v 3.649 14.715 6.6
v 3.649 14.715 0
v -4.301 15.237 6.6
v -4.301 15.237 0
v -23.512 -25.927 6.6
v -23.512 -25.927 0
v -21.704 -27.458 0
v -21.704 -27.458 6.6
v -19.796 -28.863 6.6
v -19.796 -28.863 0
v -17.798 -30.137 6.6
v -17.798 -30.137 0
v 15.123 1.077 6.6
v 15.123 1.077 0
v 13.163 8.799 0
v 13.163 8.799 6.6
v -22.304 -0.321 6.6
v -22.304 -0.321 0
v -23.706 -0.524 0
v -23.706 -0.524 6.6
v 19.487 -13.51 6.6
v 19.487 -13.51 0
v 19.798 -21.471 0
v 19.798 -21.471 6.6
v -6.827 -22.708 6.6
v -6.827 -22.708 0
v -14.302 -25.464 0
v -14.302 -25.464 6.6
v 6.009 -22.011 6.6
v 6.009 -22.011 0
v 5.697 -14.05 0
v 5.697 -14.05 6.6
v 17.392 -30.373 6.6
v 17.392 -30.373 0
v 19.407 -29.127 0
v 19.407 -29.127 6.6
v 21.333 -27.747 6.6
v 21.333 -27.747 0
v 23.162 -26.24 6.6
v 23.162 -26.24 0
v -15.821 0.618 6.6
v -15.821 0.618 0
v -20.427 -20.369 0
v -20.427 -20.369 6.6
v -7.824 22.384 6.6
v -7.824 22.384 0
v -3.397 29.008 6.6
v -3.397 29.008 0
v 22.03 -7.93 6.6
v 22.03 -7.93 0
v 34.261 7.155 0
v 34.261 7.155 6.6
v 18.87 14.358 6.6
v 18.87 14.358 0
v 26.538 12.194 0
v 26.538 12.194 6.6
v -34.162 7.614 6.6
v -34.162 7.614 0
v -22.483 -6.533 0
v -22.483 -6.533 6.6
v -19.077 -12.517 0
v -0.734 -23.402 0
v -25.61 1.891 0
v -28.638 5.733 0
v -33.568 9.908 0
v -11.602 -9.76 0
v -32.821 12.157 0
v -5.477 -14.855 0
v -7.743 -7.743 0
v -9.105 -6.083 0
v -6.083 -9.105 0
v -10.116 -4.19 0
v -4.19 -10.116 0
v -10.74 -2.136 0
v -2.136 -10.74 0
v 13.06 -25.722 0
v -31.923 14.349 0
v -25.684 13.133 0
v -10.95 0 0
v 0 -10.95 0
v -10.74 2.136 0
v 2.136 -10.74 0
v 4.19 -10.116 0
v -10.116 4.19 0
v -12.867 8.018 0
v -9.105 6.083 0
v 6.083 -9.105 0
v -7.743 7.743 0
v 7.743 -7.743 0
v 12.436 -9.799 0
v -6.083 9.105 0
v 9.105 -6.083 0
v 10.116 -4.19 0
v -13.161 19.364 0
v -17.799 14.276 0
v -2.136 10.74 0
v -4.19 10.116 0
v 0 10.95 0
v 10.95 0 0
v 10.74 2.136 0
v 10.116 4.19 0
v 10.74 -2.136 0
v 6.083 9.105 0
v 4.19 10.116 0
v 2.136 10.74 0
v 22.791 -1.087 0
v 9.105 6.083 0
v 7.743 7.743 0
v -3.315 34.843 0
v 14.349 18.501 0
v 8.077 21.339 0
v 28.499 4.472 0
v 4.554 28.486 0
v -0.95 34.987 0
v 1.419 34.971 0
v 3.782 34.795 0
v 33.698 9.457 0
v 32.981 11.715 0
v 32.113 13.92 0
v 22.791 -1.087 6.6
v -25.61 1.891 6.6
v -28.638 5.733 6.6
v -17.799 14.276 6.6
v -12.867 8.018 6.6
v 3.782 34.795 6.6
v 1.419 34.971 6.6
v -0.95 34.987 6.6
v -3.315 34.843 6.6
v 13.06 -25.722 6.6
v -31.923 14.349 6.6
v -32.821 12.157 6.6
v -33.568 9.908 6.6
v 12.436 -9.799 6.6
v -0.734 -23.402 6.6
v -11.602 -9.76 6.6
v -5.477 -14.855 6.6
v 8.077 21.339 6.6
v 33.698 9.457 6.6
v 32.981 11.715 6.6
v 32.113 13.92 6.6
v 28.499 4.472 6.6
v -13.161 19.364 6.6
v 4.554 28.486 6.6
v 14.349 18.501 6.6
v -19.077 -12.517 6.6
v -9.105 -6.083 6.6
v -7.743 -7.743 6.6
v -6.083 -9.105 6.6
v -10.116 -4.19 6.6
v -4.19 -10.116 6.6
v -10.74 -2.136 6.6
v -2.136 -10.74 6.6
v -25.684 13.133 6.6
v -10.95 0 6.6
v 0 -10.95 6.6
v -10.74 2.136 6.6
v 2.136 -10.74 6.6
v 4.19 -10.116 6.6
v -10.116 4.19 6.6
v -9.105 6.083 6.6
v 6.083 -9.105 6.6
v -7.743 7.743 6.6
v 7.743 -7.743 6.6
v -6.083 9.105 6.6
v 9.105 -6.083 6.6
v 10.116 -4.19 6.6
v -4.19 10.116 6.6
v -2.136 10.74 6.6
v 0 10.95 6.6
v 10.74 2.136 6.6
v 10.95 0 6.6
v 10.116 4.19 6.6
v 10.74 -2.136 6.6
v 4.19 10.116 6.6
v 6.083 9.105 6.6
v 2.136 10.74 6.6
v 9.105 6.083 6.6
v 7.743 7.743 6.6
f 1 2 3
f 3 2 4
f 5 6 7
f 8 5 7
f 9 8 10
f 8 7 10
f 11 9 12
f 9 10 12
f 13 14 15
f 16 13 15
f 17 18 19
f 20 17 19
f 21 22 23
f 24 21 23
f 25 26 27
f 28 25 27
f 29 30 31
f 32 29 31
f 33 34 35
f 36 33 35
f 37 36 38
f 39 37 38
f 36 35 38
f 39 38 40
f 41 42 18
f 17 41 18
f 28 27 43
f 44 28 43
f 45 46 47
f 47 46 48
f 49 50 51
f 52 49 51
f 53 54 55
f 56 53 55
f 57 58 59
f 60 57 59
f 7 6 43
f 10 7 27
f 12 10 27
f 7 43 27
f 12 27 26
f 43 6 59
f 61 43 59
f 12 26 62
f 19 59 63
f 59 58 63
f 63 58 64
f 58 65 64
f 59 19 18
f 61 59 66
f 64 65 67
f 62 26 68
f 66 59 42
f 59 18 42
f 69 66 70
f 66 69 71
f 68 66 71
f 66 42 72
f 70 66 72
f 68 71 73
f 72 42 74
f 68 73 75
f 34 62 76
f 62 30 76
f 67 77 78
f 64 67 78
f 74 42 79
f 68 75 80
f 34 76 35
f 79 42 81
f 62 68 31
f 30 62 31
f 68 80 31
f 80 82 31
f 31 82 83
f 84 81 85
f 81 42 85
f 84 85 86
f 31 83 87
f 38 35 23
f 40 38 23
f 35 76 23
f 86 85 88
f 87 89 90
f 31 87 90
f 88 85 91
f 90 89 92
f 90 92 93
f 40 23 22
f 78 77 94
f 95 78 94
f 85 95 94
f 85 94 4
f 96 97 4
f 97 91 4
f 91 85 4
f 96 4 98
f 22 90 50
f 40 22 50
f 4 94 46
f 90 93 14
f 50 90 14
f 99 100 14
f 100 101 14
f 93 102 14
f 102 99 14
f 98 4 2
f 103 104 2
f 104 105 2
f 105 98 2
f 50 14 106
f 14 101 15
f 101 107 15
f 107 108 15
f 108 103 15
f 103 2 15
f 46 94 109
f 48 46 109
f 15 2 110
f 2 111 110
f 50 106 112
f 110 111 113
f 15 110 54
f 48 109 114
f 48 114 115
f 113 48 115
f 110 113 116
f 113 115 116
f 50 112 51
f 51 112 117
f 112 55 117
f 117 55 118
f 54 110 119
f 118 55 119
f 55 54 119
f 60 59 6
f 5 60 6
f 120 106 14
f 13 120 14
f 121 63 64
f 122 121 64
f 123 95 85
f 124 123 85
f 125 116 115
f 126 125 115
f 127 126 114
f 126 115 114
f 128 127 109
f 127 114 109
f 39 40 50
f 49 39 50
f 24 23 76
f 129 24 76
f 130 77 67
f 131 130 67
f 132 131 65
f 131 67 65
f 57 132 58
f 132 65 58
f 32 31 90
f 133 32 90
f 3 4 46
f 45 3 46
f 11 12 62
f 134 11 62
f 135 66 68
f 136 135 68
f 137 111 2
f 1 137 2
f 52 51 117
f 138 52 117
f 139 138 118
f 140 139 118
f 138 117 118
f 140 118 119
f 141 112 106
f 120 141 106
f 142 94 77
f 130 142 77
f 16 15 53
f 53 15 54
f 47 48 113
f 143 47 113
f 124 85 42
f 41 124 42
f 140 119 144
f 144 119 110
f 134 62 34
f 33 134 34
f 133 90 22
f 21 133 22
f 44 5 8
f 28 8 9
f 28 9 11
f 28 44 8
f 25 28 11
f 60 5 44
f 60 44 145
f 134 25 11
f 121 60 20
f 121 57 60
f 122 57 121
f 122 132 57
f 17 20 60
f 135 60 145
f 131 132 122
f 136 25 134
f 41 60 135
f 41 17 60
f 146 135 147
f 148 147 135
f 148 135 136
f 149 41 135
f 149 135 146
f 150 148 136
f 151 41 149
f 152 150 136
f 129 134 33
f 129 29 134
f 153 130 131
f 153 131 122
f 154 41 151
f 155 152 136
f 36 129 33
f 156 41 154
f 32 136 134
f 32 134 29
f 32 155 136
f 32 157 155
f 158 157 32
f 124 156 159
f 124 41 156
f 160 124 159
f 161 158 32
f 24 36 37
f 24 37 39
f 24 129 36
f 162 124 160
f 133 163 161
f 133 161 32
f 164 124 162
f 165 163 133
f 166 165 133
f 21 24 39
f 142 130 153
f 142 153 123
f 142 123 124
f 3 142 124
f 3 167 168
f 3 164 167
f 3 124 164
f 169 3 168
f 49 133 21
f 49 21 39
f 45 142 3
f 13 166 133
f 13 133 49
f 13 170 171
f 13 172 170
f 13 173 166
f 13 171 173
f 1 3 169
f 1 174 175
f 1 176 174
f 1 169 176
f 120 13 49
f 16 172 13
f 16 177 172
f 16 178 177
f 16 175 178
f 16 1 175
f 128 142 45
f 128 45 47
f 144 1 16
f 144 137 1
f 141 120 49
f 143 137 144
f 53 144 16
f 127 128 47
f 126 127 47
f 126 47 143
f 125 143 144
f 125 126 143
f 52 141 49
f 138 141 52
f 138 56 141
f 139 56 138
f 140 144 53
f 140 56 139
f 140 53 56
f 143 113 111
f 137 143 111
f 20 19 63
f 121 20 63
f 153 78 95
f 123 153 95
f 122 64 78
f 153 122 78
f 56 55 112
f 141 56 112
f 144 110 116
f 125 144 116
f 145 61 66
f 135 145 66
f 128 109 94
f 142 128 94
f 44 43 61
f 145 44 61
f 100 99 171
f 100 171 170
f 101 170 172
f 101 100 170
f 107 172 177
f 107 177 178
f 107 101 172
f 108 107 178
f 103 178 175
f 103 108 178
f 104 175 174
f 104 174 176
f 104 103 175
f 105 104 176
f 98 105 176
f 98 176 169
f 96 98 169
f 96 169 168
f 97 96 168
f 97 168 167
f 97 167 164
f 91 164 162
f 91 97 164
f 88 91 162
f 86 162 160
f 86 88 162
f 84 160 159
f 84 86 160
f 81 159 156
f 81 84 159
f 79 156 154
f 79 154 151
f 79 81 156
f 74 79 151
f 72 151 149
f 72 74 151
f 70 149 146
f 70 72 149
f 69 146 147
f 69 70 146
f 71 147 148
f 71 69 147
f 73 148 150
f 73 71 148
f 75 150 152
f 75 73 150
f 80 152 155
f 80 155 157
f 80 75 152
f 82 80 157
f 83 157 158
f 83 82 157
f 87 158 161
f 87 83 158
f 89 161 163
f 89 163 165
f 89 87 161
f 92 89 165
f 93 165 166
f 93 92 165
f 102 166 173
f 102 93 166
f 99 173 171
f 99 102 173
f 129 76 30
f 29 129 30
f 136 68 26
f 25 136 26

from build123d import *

# Parameters (mm, degrees)
F0_R     = 10.95
F1_DEPTH = 6.6


with BuildPart() as f1:
    # F0 (on Top) → F1 (new body)
    with BuildSketch(Plane.XY):
        with BuildLine():
            Line((-22.483416, -6.533214), (-23.511816, -25.926714))
            ThreePointArc((-23.511816, -25.926714), (-20.762047, -28.176895), (-17.79831, -30.136691))
            Line((-17.79831, -30.136691), (-0.734302, -23.401873))
            Line((-0.734302, -23.401873), (17.39222, -30.372861))
            ThreePointArc((17.39222, -30.372861), (20.381994, -28.45302), (23.161716, -26.239949))
            Line((23.161716, -26.239949), (22.029592, -7.929939))
            Line((22.029592, -7.929939), (34.260799, 7.155253))
            ThreePointArc((34.260799, 7.155253), (33.358812, 10.591961), (32.113038, 13.919511))
            Line((32.113038, 13.919511), (14.349339, 18.500901))
            Line((14.349339, 18.500901), (3.782119, 34.795051))
            ThreePointArc((3.782119, 34.795051), (0.234886, 34.999212), (-3.314767, 34.84268))
            Line((-3.314767, 34.84268), (-13.161213, 19.364125))
            Line((-13.161213, 19.364125), (-31.923321, 14.349271))
            ThreePointArc((-31.923321, 14.349271), (-33.213645, 11.038741), (-34.161677, 7.614449))
            Line((-34.161677, 7.614449), (-22.483416, -6.533214))
        make_face()
        Polygon((-5.476719, -14.85534), (-6.826935, -22.707532), (-14.30224, -25.464306), (-20.42733, -20.368889), (-19.077114, -12.516697), (-11.601808, -9.759923), align=None, mode=Mode.SUBTRACT)
        Circle(F0_R, mode=Mode.SUBTRACT)
        Polygon((12.435869, -9.799222), (19.486507, -13.509814), (19.798359, -21.471142), (13.059573, -25.721878), (6.008934, -22.011286), (5.697082, -14.049958), align=None, mode=Mode.SUBTRACT)
        Polygon((-23.705785, -0.524213), (-25.609628, 1.891393), (-28.63763, 5.733335), (-25.684357, 13.133212), (-17.799239, 14.275541), (-12.867394, 8.017994), (-15.820667, 0.618117), (-22.303521, -0.321064), align=None, mode=Mode.SUBTRACT)
        Polygon((13.162508, 8.799088), (18.870258, 14.358008), (26.538299, 12.194411), (28.49859, 4.471894), (22.79084, -1.087025), (15.122799, 1.076571), align=None, mode=Mode.SUBTRACT)
        Polygon((-4.300991, 15.237357), (-7.824046, 22.383551), (-3.396788, 29.007702), (4.553524, 28.485661), (8.076579, 21.339467), (3.649322, 14.715315), align=None, mode=Mode.SUBTRACT)
    extrude(amount=F1_DEPTH)


solid = f1.part
